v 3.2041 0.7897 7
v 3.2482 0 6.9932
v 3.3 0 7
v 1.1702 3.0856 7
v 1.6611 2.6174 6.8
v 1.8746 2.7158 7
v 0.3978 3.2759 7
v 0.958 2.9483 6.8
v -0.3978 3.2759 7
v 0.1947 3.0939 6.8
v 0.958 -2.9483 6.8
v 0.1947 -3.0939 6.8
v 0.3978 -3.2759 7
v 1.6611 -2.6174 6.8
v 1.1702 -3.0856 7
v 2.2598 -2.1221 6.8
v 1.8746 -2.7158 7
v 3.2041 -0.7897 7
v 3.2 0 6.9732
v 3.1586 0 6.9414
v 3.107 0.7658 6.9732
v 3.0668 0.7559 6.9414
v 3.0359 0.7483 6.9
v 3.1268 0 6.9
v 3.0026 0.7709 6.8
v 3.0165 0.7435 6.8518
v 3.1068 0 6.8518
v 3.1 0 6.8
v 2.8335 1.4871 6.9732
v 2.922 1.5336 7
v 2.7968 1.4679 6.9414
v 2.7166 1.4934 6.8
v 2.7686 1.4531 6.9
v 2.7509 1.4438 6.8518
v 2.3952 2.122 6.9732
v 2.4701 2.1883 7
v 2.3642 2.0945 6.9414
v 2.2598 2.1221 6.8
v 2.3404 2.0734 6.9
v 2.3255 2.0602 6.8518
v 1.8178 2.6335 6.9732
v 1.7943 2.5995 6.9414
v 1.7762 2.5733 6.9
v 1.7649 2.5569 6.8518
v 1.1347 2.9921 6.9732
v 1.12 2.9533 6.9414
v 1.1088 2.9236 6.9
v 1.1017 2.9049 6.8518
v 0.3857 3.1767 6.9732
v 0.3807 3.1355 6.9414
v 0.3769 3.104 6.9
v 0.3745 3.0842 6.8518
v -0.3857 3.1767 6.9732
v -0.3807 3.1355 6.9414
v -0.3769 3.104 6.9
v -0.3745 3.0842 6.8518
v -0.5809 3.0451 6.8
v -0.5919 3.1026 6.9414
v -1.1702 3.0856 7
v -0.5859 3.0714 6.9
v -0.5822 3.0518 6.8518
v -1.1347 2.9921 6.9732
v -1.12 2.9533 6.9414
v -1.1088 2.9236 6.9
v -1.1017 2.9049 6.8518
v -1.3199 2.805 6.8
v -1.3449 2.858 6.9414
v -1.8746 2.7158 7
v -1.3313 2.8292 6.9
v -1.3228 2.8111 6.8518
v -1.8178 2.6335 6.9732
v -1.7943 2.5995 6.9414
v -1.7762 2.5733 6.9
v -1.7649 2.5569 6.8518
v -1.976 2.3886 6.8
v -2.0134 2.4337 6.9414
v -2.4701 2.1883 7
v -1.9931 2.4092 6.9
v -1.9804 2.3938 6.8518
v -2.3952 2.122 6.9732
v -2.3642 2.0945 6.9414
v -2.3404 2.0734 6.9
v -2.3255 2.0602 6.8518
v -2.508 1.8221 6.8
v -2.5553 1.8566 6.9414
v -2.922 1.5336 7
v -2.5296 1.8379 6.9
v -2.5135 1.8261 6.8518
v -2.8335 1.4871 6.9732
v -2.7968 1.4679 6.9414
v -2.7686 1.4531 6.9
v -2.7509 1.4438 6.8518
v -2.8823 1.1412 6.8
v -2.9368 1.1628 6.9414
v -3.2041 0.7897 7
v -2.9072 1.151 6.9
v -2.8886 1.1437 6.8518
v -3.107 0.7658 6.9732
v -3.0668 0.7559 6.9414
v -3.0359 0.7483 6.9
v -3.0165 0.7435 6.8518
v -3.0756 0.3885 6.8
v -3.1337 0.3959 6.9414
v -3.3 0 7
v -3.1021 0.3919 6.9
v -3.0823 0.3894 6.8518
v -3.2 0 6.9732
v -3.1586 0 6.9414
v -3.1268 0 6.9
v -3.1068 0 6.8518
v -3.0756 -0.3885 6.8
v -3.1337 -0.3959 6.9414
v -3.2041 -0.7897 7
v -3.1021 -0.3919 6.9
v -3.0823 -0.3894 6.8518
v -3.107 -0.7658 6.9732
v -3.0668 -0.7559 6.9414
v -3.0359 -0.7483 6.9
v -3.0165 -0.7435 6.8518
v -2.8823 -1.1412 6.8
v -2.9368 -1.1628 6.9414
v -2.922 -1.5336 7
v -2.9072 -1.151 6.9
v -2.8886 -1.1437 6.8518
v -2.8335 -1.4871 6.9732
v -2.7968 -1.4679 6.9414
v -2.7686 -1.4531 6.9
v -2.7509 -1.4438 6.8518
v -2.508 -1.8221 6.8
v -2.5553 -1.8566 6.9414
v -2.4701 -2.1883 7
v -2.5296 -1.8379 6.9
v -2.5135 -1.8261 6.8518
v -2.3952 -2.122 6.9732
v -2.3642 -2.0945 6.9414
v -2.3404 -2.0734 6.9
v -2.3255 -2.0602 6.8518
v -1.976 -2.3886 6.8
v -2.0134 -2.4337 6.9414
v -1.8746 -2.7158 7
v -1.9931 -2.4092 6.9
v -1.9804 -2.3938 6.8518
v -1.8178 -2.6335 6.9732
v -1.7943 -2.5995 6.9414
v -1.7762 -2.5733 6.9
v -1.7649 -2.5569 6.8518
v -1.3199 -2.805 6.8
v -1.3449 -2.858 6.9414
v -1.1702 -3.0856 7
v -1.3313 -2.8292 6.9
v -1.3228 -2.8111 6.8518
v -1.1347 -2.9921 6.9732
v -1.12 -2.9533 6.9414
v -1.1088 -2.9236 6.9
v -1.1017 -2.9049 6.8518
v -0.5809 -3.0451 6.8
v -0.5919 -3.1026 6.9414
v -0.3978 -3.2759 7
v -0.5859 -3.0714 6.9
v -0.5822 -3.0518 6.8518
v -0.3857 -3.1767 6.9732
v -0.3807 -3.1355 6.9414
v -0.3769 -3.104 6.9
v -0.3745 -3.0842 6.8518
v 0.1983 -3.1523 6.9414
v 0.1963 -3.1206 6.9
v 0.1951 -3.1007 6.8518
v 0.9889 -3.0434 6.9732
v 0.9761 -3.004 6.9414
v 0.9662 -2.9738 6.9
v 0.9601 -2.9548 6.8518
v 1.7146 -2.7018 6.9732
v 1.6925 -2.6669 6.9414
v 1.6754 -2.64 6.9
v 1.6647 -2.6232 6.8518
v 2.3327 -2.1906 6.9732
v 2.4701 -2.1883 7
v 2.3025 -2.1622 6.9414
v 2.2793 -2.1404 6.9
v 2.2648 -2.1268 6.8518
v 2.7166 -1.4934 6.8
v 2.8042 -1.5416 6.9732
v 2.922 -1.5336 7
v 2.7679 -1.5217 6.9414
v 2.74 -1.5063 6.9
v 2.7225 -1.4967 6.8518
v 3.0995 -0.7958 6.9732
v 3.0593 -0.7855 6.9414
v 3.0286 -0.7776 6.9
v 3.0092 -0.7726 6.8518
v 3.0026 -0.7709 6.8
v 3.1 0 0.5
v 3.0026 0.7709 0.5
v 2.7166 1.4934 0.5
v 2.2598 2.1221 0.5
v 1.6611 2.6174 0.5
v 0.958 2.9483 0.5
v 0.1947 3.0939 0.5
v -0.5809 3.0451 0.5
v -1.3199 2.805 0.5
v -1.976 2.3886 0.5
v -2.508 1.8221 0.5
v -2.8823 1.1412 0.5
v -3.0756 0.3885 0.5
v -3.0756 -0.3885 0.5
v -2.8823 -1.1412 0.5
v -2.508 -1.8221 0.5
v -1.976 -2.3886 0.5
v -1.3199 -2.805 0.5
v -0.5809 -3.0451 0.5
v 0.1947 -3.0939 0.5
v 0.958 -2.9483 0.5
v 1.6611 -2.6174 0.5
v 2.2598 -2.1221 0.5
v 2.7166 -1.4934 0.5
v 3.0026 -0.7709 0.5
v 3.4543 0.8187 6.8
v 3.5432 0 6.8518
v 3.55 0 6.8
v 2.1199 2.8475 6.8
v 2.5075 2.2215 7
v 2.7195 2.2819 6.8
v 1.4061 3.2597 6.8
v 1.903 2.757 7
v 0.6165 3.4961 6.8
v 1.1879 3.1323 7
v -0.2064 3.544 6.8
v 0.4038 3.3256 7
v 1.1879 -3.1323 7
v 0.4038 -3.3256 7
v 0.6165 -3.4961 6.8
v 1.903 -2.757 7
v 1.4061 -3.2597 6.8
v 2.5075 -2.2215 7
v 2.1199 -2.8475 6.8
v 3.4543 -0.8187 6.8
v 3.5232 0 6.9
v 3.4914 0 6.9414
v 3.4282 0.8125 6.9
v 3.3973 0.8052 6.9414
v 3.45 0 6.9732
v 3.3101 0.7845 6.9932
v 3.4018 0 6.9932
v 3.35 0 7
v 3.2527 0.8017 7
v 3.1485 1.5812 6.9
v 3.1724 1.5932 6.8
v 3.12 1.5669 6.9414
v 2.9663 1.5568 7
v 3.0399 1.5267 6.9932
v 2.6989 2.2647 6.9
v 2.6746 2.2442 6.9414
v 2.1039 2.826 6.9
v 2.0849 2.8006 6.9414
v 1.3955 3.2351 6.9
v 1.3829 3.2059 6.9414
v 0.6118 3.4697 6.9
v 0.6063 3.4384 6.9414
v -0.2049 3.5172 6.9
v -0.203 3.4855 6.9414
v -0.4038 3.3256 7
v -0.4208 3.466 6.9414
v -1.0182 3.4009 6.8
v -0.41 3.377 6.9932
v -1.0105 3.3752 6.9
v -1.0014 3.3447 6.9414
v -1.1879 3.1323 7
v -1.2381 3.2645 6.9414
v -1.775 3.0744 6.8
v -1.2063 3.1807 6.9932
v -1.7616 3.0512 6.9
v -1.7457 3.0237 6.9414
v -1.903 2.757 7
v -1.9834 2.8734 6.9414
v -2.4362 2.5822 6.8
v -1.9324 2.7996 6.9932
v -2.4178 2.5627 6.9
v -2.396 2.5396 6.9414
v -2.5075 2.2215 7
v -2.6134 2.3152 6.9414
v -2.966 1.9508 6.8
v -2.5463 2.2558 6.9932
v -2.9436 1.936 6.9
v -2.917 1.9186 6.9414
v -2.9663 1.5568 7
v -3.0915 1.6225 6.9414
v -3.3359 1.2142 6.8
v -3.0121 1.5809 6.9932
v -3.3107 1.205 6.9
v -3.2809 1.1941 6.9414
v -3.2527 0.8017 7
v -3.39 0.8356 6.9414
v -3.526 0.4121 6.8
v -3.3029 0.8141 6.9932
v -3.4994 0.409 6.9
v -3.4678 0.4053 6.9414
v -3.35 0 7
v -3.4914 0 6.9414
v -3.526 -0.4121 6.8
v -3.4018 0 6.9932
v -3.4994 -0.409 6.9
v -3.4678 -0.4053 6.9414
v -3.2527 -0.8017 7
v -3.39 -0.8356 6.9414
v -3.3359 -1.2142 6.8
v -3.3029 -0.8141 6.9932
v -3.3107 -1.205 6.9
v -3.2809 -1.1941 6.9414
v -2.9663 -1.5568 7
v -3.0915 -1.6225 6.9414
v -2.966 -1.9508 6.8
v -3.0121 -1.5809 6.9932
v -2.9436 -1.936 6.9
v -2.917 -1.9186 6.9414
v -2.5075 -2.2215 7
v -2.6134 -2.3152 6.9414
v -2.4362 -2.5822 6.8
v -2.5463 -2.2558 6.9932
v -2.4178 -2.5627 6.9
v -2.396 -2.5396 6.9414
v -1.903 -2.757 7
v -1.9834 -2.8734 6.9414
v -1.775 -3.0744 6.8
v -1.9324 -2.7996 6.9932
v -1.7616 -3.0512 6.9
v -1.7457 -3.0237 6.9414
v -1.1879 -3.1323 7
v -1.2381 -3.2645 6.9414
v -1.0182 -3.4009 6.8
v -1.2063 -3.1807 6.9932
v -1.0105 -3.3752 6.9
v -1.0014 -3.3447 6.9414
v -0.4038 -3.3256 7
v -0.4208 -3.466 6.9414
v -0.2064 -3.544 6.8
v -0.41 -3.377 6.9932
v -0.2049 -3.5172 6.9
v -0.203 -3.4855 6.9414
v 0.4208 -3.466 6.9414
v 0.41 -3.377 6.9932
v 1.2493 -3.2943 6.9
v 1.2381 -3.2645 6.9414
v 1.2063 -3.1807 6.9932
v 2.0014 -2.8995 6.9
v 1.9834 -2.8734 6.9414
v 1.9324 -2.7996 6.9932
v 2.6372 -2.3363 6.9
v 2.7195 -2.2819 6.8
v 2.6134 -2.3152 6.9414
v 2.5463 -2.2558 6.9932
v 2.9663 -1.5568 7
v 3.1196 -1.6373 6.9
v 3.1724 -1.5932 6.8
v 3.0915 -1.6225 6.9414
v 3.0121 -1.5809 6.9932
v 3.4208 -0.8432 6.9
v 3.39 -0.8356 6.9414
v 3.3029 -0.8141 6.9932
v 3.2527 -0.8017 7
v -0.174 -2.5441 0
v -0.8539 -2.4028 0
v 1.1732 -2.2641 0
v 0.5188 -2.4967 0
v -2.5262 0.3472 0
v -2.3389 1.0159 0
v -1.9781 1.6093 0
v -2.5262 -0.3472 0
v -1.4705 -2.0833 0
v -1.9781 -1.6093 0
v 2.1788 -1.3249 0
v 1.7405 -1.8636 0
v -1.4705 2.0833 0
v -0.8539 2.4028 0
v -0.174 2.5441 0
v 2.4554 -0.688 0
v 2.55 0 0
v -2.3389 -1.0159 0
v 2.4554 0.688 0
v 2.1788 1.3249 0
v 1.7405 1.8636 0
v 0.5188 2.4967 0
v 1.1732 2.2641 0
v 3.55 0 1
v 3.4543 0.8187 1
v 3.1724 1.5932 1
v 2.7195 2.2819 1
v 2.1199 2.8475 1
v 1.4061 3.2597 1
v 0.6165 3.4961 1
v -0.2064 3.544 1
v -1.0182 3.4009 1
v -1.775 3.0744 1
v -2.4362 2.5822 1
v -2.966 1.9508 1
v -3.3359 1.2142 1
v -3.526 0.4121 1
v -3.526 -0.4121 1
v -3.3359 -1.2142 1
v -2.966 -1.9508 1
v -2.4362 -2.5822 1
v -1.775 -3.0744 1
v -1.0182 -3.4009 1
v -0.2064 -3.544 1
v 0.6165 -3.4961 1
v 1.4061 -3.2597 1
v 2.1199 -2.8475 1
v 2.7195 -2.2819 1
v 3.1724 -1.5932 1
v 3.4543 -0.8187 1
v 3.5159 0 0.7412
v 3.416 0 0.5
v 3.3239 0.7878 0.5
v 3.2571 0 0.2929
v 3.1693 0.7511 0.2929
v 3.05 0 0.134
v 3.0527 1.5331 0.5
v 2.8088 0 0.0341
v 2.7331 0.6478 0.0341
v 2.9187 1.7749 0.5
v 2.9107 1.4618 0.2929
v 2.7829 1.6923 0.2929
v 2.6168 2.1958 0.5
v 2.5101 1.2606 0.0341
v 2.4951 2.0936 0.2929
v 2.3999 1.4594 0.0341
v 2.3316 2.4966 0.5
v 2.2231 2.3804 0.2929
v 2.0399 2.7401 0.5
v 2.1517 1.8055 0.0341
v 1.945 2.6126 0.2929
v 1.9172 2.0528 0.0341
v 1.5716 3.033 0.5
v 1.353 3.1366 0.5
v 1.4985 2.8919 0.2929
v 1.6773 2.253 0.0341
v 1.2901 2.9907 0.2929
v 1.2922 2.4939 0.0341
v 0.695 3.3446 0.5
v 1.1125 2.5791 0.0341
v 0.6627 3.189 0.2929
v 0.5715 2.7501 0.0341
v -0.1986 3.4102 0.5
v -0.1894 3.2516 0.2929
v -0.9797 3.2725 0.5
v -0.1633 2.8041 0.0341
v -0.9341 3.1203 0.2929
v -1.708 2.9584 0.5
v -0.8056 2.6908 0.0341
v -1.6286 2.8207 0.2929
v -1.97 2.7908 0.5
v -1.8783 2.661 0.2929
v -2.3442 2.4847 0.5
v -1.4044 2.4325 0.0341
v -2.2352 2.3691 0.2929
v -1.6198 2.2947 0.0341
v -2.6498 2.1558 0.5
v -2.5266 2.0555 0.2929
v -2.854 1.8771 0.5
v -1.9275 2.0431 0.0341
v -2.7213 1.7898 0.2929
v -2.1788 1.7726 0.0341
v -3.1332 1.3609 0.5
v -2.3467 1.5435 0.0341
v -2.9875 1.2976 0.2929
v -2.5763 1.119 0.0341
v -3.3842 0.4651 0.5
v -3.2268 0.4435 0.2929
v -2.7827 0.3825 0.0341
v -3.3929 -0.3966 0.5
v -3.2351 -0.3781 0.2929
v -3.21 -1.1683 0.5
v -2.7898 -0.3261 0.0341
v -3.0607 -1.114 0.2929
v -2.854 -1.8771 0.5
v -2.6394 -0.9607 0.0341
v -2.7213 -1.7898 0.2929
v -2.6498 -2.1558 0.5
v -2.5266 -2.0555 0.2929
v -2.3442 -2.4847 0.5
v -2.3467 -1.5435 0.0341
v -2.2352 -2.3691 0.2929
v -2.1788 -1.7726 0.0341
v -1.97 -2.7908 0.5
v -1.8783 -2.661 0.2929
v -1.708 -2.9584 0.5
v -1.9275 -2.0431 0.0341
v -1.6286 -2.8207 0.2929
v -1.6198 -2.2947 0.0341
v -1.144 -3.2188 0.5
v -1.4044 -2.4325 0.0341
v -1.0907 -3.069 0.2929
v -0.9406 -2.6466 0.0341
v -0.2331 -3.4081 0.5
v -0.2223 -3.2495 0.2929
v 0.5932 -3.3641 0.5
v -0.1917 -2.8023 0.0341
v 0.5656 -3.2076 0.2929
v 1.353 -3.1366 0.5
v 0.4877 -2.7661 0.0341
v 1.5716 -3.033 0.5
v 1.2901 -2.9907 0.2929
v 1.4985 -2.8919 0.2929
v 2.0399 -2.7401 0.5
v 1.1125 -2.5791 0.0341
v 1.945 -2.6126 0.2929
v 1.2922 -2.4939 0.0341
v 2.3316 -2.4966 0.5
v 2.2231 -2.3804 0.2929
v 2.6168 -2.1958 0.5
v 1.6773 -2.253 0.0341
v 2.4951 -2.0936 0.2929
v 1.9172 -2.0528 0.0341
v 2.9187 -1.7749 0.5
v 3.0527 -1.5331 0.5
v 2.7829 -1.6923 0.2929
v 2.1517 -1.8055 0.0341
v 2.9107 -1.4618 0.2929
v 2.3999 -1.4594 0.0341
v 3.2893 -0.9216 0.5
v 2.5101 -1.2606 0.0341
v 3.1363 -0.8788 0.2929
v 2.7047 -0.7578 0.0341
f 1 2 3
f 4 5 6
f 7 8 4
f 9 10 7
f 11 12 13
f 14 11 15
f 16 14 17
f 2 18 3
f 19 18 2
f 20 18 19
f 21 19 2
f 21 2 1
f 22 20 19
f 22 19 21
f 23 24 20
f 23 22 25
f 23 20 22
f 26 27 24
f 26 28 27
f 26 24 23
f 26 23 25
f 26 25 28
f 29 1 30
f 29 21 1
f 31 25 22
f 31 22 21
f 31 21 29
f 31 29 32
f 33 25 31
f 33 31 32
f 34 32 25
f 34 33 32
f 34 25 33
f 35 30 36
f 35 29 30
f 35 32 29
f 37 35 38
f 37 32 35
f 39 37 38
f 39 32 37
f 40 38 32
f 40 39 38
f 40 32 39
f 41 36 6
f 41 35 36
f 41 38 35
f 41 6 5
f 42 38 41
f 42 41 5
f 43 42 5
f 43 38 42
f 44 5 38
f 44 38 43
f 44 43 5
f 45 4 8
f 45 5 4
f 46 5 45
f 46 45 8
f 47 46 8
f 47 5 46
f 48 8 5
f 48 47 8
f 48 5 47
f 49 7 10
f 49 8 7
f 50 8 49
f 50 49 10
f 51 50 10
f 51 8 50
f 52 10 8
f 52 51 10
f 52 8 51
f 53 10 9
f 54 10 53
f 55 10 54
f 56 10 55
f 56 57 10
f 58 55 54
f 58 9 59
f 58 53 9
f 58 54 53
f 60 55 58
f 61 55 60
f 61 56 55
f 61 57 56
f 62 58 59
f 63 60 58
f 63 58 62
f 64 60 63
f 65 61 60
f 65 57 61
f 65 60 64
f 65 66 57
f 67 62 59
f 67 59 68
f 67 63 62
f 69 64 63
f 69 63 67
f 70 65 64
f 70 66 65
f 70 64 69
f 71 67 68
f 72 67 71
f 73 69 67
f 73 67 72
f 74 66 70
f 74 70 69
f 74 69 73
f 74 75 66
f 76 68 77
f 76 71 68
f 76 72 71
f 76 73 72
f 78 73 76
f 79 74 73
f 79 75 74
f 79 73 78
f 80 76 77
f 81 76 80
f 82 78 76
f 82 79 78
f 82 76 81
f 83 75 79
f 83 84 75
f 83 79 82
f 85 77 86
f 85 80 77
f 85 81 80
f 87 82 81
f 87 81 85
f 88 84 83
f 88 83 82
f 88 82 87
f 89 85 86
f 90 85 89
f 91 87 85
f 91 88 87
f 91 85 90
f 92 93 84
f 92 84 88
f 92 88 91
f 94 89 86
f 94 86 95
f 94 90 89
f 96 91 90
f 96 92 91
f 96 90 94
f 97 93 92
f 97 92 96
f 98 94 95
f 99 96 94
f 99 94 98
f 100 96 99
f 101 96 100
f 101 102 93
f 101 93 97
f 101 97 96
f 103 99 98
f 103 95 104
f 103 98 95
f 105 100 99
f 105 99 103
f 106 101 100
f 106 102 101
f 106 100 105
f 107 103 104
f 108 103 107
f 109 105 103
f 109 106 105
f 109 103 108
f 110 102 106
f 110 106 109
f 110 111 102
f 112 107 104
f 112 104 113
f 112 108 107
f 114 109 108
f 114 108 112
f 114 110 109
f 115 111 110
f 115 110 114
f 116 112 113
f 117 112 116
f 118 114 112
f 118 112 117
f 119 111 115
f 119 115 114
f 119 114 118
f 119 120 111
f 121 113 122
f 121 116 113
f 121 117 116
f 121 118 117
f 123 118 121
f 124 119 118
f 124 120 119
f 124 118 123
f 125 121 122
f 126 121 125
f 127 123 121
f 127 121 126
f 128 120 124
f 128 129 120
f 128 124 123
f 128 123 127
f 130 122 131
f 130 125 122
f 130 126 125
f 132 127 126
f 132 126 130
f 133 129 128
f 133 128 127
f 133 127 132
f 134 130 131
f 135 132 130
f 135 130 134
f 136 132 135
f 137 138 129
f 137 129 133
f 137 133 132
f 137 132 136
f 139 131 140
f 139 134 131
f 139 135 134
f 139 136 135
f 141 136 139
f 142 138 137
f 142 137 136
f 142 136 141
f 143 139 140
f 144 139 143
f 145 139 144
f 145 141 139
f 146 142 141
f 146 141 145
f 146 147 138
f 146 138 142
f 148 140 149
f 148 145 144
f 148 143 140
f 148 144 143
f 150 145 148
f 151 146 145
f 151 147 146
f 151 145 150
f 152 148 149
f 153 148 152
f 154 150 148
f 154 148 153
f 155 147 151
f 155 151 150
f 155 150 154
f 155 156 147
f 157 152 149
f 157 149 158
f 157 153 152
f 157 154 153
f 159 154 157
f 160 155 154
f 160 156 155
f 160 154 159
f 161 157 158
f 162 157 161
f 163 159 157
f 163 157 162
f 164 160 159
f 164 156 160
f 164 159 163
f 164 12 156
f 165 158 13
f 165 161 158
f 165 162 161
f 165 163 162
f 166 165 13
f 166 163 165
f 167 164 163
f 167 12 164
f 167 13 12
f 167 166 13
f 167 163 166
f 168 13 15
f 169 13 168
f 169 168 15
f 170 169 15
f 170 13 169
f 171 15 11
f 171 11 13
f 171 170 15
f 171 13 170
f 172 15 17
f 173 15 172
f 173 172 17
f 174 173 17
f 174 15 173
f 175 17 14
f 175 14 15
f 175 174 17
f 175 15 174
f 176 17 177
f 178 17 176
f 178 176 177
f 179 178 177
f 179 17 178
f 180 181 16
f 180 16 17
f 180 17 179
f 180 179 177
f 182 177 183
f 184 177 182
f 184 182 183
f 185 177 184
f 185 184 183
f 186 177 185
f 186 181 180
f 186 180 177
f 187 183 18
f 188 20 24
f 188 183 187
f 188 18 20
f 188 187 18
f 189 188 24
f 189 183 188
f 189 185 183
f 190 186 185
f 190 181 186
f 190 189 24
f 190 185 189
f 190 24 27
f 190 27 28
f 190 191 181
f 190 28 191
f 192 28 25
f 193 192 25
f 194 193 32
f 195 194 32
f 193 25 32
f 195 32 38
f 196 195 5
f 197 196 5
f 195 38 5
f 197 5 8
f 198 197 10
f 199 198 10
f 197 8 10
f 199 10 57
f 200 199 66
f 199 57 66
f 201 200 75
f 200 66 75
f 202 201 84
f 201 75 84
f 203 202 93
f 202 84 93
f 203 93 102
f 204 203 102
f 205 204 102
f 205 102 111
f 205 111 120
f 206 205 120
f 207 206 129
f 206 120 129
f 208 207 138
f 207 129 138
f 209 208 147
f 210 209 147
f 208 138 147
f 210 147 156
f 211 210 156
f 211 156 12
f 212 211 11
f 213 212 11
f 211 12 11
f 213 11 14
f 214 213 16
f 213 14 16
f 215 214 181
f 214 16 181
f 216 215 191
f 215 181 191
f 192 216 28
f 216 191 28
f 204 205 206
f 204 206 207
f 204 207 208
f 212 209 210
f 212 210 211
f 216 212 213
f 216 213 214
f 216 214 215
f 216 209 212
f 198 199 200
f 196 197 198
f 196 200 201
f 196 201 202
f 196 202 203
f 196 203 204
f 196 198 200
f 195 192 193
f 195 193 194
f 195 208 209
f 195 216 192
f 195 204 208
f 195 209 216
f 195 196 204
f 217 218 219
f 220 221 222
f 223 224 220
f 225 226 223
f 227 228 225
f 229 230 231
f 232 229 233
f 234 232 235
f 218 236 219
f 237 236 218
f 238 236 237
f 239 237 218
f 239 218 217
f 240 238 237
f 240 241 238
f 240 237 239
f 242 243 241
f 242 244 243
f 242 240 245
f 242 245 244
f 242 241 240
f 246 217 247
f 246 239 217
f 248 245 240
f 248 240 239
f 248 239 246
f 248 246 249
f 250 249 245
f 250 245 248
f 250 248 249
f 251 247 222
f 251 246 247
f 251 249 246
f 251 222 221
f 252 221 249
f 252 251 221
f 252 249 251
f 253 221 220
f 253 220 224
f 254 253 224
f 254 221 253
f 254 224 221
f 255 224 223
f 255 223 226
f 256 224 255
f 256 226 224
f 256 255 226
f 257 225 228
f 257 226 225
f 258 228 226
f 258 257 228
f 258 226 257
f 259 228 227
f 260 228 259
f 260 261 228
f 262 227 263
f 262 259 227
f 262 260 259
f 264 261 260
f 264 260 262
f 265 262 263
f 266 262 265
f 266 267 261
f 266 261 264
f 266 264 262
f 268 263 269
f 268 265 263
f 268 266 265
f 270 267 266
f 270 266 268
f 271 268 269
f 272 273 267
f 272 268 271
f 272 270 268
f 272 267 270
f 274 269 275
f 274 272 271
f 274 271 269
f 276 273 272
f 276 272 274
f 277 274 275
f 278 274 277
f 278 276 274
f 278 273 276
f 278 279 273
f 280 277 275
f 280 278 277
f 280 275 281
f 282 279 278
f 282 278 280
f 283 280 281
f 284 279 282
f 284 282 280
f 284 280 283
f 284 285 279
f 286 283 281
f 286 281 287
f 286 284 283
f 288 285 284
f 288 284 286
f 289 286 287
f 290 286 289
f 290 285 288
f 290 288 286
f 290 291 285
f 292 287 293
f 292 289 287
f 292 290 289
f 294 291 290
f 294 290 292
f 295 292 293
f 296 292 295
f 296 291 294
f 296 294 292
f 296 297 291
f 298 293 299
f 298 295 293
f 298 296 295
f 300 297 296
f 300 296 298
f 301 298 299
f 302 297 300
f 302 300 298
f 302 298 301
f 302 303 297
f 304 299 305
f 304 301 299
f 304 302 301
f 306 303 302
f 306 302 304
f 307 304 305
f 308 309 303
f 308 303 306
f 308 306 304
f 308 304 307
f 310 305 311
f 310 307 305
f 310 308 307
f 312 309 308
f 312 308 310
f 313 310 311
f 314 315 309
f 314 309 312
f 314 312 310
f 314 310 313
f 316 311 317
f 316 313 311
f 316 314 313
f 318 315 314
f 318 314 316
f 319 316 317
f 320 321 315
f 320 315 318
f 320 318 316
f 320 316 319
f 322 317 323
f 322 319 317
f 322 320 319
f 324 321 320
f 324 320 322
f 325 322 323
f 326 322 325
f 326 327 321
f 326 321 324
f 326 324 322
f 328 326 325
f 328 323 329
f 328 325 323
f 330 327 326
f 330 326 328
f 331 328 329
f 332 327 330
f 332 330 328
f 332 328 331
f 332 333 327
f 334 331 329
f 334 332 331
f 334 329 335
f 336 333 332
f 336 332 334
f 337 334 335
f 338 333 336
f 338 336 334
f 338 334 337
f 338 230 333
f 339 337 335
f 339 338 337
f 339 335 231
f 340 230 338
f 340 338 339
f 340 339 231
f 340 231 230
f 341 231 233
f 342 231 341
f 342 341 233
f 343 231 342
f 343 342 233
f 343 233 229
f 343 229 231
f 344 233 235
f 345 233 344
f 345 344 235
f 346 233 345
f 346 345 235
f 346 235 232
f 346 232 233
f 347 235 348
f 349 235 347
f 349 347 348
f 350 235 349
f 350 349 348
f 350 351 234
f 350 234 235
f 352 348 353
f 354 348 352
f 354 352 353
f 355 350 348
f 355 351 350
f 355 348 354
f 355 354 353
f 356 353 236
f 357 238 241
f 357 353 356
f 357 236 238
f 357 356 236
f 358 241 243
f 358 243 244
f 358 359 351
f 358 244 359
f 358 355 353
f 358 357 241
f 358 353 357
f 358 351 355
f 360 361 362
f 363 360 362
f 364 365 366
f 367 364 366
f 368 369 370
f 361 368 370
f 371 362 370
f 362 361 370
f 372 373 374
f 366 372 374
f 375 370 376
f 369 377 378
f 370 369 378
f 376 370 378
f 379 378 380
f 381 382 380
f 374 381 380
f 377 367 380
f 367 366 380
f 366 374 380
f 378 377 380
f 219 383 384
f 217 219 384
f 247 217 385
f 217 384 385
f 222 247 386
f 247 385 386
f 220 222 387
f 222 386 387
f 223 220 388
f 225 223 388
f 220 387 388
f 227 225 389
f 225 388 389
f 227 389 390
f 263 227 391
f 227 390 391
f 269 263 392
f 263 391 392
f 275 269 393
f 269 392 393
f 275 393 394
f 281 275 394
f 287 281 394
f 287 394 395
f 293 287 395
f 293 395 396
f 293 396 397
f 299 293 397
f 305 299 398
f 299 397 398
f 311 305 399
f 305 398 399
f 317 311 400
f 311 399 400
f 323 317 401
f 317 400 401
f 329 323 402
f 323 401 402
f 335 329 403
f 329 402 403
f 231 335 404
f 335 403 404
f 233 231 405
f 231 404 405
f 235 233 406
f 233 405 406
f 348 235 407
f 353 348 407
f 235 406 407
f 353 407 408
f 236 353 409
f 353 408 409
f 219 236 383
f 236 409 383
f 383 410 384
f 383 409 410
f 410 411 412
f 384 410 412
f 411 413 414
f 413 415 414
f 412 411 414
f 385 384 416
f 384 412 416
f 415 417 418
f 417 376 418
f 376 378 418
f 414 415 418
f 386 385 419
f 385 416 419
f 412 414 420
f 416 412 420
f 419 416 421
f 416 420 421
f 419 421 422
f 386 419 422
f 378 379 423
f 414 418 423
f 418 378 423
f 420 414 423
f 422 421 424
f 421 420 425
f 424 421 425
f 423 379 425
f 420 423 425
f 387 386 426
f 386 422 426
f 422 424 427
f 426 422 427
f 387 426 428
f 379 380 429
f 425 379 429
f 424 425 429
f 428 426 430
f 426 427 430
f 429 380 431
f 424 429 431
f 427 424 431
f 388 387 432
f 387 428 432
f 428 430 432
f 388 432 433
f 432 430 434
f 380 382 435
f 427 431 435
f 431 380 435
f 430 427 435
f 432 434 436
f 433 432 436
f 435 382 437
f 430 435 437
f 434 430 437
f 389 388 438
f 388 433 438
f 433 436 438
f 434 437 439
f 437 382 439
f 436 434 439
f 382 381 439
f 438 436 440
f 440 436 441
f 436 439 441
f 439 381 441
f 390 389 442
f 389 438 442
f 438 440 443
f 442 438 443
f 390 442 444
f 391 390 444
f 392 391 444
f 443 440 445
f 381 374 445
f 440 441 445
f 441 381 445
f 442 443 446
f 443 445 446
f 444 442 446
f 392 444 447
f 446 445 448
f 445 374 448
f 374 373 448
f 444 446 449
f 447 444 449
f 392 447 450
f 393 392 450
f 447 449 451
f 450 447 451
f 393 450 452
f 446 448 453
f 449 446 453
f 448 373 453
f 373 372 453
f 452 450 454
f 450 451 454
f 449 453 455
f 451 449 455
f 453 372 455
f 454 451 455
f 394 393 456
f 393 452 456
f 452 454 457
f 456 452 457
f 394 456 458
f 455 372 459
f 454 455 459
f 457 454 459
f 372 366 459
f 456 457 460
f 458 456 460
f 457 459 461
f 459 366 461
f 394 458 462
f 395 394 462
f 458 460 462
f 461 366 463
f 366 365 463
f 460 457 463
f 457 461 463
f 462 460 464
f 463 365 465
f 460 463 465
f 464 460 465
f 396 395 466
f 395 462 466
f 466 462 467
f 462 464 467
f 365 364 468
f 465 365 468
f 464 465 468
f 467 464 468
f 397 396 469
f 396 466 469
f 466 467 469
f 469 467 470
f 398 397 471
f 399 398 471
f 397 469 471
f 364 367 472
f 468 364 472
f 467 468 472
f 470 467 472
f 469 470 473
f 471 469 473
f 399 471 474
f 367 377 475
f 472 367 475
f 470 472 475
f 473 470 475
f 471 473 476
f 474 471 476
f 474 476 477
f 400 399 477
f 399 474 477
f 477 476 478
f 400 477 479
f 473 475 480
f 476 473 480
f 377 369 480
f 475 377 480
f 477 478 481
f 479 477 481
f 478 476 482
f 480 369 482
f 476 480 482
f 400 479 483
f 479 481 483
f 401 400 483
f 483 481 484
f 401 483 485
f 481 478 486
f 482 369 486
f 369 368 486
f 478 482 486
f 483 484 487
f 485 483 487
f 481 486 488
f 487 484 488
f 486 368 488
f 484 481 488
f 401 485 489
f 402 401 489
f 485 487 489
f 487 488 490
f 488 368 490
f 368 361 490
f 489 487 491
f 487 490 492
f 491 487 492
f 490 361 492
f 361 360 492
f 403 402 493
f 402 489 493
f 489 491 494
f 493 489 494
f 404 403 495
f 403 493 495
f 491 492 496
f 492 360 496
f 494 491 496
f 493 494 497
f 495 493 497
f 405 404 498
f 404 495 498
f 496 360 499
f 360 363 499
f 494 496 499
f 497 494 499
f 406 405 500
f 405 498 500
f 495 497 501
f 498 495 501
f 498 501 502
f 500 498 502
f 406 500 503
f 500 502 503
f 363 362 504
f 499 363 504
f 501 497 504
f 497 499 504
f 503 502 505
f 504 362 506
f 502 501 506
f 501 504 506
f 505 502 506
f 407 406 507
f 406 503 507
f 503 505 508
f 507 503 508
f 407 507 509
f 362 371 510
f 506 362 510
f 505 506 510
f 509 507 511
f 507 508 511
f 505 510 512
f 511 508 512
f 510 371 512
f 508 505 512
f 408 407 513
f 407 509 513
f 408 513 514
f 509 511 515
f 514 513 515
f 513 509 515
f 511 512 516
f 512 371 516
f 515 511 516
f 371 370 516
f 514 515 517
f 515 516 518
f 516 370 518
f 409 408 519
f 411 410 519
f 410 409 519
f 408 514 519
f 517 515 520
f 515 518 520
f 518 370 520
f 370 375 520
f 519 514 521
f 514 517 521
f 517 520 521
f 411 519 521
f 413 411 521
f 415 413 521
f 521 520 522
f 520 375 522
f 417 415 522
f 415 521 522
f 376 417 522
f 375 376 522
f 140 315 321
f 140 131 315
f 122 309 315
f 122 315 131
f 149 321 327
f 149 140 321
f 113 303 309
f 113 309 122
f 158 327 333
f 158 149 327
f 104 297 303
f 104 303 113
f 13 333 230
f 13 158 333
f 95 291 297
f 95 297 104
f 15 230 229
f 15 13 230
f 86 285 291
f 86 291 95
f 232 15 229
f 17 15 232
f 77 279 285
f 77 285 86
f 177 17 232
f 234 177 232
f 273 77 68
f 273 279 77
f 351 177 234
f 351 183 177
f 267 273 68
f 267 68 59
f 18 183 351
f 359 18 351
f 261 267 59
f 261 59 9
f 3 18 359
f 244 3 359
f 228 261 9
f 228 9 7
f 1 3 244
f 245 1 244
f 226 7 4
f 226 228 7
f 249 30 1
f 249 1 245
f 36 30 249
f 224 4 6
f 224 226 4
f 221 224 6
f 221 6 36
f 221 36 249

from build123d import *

# Parameters (mm, degrees)
SKETCH1_R           = 3.55
BOSS_EXTRUDE1_DEPTH = 7
SKETCH2_R           = 3.1
CUT_EXTRUDE1_DEPTH  = 6.5
FILLET1_R           = 0.2
FILLET2_R           = 1


with BuildPart() as part:
    # Sketch1 → Boss-Extrude1 (new body)
    with BuildSketch(Plane.XY):
        Circle(SKETCH1_R)
    extrude(amount=BOSS_EXTRUDE1_DEPTH)

    # Sketch2 → Cut-Extrude1 (cut)
    with BuildSketch(Plane.XY.offset(7)):
        Circle(SKETCH2_R)
    extrude(amount=-CUT_EXTRUDE1_DEPTH, mode=Mode.SUBTRACT)

    # Fillet1
    fillet1_edges = [part.edges().sort_by_distance(p)[0] for p in [
        (-3.55, 0, 7),
        (-3.1, 0, 7),
    ]]
    fillet(fillet1_edges, radius=FILLET1_R)

    # Fillet2
    fillet2_edges = [part.edges().sort_by_distance(p)[0] for p in [
        (-3.55, 0, 0),
    ]]
    fillet(fillet2_edges, radius=FILLET2_R)


solid = part.part
